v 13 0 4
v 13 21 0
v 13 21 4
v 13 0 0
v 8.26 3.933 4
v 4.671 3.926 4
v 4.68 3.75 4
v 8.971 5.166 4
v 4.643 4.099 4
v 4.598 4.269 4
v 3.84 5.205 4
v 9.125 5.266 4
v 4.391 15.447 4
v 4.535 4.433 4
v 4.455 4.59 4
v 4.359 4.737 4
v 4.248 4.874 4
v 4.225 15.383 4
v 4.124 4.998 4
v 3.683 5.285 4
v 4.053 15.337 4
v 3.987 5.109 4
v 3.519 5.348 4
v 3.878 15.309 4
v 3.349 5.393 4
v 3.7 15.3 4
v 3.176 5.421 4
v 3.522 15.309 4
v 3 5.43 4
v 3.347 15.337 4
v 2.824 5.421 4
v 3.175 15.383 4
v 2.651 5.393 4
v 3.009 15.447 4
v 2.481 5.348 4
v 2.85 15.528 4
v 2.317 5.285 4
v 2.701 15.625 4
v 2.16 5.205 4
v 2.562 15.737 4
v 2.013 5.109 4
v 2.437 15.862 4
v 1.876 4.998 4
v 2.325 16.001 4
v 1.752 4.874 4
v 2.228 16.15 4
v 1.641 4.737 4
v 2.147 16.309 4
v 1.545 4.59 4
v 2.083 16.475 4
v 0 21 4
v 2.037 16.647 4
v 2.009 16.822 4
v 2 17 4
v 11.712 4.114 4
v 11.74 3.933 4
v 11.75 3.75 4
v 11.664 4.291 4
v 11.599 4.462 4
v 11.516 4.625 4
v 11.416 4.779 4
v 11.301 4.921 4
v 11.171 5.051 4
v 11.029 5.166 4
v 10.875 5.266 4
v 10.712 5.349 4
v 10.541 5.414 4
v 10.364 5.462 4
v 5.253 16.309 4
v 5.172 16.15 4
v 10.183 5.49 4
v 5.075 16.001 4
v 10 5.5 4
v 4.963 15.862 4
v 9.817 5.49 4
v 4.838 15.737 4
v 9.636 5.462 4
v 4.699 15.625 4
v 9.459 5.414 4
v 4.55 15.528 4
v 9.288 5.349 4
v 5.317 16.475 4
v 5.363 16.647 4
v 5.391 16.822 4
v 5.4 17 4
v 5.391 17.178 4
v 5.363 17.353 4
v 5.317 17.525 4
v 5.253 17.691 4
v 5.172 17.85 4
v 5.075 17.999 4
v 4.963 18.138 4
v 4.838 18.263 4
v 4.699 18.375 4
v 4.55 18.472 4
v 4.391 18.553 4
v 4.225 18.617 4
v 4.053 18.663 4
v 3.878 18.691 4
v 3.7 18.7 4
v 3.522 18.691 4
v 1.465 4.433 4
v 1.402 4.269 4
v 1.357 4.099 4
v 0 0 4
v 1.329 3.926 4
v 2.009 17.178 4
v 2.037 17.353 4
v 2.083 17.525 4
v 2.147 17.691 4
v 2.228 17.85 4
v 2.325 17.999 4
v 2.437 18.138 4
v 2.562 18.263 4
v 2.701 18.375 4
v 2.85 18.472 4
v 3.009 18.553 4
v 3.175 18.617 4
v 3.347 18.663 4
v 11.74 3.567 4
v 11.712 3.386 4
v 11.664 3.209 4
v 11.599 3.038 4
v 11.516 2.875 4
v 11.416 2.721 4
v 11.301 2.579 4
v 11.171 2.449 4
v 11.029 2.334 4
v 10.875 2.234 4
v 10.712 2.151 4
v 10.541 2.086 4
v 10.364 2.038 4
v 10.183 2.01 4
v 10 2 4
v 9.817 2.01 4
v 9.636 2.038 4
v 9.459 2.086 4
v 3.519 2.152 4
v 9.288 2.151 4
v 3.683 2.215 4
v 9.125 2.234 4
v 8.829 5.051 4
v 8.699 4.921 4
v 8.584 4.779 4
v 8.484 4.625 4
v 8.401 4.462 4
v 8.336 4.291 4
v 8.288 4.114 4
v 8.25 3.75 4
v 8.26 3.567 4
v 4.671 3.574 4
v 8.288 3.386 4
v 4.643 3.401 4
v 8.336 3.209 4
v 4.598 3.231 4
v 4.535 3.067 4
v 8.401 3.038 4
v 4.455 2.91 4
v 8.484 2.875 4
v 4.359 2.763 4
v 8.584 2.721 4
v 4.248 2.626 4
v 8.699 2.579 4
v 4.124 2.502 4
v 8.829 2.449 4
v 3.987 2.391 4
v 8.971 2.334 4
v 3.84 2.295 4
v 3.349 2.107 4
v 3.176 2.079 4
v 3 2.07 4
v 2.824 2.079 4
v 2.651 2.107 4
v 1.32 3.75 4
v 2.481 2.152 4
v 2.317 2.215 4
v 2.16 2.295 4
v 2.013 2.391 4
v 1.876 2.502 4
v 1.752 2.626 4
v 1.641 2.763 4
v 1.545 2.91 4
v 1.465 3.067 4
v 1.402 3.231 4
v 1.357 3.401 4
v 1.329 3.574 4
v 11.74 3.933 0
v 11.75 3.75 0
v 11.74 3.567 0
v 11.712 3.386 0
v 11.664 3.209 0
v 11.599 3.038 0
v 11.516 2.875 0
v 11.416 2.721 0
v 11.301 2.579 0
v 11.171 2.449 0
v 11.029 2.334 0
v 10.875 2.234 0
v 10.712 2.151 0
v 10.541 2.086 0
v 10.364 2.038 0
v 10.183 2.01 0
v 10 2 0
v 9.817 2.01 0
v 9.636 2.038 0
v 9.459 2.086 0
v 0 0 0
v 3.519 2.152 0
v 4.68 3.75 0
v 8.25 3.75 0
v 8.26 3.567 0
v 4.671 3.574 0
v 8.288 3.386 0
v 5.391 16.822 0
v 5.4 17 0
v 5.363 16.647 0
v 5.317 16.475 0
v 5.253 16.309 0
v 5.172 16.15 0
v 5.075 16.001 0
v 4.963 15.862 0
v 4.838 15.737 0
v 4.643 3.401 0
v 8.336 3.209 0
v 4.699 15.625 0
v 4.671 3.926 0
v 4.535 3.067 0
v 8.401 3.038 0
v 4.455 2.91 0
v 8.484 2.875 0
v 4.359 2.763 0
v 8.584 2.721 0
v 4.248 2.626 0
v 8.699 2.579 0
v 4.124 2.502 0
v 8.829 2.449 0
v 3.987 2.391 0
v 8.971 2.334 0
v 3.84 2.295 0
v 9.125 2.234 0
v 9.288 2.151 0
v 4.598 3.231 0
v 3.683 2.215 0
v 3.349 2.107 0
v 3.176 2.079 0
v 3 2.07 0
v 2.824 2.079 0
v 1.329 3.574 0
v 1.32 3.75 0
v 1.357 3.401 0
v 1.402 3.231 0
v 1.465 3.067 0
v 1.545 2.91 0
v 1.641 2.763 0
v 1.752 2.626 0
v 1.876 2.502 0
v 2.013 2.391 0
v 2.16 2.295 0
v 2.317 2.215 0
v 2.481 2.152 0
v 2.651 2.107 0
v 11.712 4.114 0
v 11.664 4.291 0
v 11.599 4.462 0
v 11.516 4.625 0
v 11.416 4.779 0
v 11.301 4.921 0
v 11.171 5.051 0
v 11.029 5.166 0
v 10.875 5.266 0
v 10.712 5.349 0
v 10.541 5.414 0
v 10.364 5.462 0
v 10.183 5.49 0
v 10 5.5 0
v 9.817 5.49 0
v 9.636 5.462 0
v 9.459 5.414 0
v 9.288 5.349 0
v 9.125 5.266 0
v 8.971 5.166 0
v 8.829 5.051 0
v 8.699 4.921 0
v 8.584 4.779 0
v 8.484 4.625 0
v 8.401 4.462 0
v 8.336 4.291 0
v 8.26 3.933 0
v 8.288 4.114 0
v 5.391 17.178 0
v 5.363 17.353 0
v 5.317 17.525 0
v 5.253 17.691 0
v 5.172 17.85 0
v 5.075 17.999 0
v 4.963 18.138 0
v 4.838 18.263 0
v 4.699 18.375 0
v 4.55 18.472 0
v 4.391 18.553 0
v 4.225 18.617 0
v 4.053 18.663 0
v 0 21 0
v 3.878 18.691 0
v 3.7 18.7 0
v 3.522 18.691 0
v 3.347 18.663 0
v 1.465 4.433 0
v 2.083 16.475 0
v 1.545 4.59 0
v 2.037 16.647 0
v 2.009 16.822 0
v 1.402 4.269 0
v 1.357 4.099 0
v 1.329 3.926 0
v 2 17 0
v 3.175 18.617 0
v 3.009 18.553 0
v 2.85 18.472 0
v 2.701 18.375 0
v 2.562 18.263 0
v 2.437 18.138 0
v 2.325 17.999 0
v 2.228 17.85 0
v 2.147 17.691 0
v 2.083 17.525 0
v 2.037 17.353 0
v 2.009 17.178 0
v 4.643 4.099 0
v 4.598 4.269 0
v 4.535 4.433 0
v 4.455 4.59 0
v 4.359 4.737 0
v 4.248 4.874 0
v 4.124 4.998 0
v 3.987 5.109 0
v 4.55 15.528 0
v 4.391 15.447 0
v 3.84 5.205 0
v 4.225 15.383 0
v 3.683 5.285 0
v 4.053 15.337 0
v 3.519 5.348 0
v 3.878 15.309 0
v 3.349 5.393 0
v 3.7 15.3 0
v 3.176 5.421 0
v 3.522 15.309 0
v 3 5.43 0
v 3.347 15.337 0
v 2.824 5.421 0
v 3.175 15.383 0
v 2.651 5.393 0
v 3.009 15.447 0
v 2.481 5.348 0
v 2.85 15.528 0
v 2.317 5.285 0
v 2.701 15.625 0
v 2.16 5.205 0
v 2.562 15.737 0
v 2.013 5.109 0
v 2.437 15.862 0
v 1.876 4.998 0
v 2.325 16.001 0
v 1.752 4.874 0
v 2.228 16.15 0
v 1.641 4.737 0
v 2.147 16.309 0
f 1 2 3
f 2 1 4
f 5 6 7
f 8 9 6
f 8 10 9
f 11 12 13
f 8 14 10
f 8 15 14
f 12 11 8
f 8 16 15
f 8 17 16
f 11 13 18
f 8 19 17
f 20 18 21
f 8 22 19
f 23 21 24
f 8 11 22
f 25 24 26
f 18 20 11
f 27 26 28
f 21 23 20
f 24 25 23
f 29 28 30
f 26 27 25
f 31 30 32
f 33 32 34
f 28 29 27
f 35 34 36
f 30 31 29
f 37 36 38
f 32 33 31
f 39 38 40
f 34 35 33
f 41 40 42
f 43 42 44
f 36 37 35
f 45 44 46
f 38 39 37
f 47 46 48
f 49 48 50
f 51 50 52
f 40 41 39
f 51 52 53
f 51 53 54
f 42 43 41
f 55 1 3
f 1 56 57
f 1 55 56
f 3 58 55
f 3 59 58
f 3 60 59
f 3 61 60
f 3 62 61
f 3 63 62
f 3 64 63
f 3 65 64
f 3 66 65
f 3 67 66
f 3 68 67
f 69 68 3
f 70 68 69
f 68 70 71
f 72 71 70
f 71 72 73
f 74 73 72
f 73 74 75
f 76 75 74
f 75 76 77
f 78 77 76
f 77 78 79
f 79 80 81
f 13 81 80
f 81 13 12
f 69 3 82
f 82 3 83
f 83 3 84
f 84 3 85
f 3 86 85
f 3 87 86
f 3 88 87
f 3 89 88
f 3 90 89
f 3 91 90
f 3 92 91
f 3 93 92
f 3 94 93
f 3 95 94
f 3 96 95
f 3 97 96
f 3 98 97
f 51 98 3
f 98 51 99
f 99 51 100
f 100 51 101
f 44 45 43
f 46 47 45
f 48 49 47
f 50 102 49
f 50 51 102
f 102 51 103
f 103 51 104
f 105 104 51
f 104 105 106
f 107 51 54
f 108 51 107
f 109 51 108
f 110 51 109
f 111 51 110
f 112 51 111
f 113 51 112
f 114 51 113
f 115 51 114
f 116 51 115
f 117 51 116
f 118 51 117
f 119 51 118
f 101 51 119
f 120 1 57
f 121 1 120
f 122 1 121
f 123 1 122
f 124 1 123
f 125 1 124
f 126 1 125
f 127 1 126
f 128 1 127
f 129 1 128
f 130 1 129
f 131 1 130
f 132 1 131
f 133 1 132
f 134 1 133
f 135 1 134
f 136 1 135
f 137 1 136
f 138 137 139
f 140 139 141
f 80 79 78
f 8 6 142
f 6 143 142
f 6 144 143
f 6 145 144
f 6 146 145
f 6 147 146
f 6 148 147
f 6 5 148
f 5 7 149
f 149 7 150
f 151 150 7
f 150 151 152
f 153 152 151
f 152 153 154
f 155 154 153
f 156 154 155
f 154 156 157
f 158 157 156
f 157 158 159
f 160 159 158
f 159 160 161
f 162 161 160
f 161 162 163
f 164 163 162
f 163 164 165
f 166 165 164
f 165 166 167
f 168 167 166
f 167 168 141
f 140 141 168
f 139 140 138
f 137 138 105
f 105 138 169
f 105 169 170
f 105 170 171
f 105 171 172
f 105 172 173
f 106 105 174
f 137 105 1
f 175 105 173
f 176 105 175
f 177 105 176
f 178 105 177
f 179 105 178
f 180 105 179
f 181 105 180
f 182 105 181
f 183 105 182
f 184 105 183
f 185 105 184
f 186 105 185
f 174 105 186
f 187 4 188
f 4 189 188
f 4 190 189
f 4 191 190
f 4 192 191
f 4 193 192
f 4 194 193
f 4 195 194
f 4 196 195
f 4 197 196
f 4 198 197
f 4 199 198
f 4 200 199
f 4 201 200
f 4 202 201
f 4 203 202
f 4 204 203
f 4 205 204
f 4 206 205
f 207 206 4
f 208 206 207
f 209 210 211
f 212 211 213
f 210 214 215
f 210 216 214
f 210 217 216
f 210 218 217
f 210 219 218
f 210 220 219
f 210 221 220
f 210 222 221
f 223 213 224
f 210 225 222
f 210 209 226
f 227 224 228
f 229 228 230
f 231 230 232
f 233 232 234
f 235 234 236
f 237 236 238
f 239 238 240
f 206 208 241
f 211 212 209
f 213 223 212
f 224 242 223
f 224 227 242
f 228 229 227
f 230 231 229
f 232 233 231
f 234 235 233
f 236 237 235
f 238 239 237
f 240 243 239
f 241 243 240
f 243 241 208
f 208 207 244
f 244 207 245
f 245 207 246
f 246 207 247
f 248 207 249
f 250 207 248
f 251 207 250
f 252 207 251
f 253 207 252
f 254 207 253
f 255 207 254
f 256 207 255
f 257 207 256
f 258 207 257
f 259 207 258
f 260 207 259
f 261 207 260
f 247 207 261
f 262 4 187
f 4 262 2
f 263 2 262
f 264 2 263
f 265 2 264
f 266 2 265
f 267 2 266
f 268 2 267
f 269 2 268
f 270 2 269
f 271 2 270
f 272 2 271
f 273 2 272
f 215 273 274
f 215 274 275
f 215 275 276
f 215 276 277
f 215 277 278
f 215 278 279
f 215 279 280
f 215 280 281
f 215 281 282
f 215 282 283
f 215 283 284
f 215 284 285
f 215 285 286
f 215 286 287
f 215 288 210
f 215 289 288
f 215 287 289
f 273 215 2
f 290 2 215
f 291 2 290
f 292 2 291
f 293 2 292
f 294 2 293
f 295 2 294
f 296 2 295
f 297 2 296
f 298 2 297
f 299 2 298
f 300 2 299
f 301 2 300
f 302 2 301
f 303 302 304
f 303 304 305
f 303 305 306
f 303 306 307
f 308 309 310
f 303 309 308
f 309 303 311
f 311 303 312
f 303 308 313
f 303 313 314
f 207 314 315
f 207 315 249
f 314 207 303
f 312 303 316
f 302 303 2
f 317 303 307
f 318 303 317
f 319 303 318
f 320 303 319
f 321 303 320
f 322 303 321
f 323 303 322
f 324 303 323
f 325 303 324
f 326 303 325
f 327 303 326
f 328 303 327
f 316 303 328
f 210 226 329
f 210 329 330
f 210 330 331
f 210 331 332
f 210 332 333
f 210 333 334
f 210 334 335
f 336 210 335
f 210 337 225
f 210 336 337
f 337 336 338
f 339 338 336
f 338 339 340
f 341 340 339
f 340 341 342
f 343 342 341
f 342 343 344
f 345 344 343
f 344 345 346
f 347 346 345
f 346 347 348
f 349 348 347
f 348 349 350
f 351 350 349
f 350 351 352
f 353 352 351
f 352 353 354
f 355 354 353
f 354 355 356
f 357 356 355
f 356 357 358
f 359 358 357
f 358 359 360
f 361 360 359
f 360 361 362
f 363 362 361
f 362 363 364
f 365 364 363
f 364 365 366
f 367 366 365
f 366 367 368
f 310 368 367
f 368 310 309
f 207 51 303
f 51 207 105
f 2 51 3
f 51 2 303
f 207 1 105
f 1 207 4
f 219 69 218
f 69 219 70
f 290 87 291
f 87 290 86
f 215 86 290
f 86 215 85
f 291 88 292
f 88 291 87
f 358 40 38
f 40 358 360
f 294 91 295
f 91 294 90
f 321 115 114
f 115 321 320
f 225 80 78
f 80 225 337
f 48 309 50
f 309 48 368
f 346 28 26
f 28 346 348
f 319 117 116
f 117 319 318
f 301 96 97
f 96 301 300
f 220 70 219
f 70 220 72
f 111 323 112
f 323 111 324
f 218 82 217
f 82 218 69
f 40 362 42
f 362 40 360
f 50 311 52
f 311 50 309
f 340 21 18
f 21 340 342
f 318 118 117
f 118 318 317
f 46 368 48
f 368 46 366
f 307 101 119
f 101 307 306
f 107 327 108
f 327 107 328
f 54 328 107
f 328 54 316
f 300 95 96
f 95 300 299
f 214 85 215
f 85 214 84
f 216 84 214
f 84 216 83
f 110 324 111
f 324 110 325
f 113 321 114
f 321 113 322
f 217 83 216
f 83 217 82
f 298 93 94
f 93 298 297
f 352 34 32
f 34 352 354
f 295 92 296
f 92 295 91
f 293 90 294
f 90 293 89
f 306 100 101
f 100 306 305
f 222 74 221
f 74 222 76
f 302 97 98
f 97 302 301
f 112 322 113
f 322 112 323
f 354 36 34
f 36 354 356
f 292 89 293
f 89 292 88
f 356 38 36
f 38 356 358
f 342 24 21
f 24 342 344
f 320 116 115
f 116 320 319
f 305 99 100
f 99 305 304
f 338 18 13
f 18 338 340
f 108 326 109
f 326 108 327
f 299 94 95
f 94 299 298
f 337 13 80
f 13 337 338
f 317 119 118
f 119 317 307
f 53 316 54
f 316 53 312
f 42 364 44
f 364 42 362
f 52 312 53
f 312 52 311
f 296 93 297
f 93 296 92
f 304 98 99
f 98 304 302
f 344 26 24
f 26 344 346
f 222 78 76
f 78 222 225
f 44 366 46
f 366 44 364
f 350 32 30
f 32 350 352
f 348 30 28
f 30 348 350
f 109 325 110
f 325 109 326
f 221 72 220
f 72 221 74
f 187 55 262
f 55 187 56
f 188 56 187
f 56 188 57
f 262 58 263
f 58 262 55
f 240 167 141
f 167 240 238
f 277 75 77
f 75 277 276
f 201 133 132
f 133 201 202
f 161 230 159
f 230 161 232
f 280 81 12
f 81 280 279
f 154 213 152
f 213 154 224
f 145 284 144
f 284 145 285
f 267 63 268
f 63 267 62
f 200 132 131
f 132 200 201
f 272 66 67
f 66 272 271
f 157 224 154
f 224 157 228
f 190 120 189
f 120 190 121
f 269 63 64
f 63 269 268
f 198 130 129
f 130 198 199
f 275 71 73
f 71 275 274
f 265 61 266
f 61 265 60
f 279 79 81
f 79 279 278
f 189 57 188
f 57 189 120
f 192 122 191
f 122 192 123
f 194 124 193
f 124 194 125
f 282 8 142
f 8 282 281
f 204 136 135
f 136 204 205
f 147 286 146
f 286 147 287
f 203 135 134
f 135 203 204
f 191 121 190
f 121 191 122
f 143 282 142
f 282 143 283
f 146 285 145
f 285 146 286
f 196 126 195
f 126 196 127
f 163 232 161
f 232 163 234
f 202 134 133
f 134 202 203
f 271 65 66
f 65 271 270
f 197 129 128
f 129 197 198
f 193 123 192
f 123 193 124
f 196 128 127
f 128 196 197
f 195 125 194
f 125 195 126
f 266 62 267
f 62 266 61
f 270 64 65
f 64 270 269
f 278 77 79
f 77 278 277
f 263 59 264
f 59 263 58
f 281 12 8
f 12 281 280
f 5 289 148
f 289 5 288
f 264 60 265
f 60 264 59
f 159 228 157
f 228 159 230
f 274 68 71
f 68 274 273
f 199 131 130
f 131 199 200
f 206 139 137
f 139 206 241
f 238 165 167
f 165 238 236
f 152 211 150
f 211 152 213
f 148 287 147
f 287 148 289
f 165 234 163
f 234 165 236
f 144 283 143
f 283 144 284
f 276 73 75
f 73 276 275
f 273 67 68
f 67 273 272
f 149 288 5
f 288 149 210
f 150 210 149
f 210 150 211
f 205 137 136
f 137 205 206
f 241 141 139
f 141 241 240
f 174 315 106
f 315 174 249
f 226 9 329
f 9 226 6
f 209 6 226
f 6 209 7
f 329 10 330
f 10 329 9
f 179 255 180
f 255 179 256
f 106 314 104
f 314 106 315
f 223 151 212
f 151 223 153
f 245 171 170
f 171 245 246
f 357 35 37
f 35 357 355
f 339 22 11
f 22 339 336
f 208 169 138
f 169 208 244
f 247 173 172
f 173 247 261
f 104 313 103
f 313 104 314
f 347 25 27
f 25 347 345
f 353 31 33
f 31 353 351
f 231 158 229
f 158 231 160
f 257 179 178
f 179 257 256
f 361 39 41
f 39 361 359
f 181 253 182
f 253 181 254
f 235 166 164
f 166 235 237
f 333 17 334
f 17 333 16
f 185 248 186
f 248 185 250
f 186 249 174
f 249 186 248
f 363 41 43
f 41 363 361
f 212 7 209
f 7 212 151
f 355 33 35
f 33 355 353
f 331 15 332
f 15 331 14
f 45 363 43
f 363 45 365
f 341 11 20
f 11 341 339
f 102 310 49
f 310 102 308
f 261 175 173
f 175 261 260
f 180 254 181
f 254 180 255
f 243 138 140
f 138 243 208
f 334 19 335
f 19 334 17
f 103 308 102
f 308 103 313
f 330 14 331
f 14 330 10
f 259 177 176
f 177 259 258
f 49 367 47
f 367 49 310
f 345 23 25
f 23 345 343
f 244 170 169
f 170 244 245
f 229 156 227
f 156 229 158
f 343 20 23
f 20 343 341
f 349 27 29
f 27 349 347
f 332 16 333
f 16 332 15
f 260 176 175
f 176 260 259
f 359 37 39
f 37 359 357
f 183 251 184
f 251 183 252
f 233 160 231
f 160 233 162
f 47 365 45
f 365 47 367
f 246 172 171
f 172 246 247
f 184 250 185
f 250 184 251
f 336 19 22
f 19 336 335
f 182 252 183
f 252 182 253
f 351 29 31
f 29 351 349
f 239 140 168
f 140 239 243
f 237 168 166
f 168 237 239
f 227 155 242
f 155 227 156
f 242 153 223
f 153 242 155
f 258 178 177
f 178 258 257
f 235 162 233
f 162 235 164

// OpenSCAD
// Real Lonely T-Rex Game: Loop Bearing Mounter
// Copyright (C) 2017, Uri Shaked and Ariella Eliassaf

$fn=60;

side = 0; // 0 for left, 1 for right

loop_hole_inset = 3.7;
motor_hole_inset = 2;
hole_radius = 1.75;
height = 4;
width = 13;

mirror([0,side,0])
difference() {
    translate([0,0,0])
    cube([width,21,height]);

    translate([loop_hole_inset,17,-0.2])
    cylinder(h=height+1,r=1.7);

    translate([width/2+3.5, motor_hole_inset+hole_radius, -0.2])
    cylinder(r=hole_radius, h=height+1);

    translate([width/2-3.5, motor_hole_inset+hole_radius, 0])
    cylinder(r=1.68,h=16);
}
